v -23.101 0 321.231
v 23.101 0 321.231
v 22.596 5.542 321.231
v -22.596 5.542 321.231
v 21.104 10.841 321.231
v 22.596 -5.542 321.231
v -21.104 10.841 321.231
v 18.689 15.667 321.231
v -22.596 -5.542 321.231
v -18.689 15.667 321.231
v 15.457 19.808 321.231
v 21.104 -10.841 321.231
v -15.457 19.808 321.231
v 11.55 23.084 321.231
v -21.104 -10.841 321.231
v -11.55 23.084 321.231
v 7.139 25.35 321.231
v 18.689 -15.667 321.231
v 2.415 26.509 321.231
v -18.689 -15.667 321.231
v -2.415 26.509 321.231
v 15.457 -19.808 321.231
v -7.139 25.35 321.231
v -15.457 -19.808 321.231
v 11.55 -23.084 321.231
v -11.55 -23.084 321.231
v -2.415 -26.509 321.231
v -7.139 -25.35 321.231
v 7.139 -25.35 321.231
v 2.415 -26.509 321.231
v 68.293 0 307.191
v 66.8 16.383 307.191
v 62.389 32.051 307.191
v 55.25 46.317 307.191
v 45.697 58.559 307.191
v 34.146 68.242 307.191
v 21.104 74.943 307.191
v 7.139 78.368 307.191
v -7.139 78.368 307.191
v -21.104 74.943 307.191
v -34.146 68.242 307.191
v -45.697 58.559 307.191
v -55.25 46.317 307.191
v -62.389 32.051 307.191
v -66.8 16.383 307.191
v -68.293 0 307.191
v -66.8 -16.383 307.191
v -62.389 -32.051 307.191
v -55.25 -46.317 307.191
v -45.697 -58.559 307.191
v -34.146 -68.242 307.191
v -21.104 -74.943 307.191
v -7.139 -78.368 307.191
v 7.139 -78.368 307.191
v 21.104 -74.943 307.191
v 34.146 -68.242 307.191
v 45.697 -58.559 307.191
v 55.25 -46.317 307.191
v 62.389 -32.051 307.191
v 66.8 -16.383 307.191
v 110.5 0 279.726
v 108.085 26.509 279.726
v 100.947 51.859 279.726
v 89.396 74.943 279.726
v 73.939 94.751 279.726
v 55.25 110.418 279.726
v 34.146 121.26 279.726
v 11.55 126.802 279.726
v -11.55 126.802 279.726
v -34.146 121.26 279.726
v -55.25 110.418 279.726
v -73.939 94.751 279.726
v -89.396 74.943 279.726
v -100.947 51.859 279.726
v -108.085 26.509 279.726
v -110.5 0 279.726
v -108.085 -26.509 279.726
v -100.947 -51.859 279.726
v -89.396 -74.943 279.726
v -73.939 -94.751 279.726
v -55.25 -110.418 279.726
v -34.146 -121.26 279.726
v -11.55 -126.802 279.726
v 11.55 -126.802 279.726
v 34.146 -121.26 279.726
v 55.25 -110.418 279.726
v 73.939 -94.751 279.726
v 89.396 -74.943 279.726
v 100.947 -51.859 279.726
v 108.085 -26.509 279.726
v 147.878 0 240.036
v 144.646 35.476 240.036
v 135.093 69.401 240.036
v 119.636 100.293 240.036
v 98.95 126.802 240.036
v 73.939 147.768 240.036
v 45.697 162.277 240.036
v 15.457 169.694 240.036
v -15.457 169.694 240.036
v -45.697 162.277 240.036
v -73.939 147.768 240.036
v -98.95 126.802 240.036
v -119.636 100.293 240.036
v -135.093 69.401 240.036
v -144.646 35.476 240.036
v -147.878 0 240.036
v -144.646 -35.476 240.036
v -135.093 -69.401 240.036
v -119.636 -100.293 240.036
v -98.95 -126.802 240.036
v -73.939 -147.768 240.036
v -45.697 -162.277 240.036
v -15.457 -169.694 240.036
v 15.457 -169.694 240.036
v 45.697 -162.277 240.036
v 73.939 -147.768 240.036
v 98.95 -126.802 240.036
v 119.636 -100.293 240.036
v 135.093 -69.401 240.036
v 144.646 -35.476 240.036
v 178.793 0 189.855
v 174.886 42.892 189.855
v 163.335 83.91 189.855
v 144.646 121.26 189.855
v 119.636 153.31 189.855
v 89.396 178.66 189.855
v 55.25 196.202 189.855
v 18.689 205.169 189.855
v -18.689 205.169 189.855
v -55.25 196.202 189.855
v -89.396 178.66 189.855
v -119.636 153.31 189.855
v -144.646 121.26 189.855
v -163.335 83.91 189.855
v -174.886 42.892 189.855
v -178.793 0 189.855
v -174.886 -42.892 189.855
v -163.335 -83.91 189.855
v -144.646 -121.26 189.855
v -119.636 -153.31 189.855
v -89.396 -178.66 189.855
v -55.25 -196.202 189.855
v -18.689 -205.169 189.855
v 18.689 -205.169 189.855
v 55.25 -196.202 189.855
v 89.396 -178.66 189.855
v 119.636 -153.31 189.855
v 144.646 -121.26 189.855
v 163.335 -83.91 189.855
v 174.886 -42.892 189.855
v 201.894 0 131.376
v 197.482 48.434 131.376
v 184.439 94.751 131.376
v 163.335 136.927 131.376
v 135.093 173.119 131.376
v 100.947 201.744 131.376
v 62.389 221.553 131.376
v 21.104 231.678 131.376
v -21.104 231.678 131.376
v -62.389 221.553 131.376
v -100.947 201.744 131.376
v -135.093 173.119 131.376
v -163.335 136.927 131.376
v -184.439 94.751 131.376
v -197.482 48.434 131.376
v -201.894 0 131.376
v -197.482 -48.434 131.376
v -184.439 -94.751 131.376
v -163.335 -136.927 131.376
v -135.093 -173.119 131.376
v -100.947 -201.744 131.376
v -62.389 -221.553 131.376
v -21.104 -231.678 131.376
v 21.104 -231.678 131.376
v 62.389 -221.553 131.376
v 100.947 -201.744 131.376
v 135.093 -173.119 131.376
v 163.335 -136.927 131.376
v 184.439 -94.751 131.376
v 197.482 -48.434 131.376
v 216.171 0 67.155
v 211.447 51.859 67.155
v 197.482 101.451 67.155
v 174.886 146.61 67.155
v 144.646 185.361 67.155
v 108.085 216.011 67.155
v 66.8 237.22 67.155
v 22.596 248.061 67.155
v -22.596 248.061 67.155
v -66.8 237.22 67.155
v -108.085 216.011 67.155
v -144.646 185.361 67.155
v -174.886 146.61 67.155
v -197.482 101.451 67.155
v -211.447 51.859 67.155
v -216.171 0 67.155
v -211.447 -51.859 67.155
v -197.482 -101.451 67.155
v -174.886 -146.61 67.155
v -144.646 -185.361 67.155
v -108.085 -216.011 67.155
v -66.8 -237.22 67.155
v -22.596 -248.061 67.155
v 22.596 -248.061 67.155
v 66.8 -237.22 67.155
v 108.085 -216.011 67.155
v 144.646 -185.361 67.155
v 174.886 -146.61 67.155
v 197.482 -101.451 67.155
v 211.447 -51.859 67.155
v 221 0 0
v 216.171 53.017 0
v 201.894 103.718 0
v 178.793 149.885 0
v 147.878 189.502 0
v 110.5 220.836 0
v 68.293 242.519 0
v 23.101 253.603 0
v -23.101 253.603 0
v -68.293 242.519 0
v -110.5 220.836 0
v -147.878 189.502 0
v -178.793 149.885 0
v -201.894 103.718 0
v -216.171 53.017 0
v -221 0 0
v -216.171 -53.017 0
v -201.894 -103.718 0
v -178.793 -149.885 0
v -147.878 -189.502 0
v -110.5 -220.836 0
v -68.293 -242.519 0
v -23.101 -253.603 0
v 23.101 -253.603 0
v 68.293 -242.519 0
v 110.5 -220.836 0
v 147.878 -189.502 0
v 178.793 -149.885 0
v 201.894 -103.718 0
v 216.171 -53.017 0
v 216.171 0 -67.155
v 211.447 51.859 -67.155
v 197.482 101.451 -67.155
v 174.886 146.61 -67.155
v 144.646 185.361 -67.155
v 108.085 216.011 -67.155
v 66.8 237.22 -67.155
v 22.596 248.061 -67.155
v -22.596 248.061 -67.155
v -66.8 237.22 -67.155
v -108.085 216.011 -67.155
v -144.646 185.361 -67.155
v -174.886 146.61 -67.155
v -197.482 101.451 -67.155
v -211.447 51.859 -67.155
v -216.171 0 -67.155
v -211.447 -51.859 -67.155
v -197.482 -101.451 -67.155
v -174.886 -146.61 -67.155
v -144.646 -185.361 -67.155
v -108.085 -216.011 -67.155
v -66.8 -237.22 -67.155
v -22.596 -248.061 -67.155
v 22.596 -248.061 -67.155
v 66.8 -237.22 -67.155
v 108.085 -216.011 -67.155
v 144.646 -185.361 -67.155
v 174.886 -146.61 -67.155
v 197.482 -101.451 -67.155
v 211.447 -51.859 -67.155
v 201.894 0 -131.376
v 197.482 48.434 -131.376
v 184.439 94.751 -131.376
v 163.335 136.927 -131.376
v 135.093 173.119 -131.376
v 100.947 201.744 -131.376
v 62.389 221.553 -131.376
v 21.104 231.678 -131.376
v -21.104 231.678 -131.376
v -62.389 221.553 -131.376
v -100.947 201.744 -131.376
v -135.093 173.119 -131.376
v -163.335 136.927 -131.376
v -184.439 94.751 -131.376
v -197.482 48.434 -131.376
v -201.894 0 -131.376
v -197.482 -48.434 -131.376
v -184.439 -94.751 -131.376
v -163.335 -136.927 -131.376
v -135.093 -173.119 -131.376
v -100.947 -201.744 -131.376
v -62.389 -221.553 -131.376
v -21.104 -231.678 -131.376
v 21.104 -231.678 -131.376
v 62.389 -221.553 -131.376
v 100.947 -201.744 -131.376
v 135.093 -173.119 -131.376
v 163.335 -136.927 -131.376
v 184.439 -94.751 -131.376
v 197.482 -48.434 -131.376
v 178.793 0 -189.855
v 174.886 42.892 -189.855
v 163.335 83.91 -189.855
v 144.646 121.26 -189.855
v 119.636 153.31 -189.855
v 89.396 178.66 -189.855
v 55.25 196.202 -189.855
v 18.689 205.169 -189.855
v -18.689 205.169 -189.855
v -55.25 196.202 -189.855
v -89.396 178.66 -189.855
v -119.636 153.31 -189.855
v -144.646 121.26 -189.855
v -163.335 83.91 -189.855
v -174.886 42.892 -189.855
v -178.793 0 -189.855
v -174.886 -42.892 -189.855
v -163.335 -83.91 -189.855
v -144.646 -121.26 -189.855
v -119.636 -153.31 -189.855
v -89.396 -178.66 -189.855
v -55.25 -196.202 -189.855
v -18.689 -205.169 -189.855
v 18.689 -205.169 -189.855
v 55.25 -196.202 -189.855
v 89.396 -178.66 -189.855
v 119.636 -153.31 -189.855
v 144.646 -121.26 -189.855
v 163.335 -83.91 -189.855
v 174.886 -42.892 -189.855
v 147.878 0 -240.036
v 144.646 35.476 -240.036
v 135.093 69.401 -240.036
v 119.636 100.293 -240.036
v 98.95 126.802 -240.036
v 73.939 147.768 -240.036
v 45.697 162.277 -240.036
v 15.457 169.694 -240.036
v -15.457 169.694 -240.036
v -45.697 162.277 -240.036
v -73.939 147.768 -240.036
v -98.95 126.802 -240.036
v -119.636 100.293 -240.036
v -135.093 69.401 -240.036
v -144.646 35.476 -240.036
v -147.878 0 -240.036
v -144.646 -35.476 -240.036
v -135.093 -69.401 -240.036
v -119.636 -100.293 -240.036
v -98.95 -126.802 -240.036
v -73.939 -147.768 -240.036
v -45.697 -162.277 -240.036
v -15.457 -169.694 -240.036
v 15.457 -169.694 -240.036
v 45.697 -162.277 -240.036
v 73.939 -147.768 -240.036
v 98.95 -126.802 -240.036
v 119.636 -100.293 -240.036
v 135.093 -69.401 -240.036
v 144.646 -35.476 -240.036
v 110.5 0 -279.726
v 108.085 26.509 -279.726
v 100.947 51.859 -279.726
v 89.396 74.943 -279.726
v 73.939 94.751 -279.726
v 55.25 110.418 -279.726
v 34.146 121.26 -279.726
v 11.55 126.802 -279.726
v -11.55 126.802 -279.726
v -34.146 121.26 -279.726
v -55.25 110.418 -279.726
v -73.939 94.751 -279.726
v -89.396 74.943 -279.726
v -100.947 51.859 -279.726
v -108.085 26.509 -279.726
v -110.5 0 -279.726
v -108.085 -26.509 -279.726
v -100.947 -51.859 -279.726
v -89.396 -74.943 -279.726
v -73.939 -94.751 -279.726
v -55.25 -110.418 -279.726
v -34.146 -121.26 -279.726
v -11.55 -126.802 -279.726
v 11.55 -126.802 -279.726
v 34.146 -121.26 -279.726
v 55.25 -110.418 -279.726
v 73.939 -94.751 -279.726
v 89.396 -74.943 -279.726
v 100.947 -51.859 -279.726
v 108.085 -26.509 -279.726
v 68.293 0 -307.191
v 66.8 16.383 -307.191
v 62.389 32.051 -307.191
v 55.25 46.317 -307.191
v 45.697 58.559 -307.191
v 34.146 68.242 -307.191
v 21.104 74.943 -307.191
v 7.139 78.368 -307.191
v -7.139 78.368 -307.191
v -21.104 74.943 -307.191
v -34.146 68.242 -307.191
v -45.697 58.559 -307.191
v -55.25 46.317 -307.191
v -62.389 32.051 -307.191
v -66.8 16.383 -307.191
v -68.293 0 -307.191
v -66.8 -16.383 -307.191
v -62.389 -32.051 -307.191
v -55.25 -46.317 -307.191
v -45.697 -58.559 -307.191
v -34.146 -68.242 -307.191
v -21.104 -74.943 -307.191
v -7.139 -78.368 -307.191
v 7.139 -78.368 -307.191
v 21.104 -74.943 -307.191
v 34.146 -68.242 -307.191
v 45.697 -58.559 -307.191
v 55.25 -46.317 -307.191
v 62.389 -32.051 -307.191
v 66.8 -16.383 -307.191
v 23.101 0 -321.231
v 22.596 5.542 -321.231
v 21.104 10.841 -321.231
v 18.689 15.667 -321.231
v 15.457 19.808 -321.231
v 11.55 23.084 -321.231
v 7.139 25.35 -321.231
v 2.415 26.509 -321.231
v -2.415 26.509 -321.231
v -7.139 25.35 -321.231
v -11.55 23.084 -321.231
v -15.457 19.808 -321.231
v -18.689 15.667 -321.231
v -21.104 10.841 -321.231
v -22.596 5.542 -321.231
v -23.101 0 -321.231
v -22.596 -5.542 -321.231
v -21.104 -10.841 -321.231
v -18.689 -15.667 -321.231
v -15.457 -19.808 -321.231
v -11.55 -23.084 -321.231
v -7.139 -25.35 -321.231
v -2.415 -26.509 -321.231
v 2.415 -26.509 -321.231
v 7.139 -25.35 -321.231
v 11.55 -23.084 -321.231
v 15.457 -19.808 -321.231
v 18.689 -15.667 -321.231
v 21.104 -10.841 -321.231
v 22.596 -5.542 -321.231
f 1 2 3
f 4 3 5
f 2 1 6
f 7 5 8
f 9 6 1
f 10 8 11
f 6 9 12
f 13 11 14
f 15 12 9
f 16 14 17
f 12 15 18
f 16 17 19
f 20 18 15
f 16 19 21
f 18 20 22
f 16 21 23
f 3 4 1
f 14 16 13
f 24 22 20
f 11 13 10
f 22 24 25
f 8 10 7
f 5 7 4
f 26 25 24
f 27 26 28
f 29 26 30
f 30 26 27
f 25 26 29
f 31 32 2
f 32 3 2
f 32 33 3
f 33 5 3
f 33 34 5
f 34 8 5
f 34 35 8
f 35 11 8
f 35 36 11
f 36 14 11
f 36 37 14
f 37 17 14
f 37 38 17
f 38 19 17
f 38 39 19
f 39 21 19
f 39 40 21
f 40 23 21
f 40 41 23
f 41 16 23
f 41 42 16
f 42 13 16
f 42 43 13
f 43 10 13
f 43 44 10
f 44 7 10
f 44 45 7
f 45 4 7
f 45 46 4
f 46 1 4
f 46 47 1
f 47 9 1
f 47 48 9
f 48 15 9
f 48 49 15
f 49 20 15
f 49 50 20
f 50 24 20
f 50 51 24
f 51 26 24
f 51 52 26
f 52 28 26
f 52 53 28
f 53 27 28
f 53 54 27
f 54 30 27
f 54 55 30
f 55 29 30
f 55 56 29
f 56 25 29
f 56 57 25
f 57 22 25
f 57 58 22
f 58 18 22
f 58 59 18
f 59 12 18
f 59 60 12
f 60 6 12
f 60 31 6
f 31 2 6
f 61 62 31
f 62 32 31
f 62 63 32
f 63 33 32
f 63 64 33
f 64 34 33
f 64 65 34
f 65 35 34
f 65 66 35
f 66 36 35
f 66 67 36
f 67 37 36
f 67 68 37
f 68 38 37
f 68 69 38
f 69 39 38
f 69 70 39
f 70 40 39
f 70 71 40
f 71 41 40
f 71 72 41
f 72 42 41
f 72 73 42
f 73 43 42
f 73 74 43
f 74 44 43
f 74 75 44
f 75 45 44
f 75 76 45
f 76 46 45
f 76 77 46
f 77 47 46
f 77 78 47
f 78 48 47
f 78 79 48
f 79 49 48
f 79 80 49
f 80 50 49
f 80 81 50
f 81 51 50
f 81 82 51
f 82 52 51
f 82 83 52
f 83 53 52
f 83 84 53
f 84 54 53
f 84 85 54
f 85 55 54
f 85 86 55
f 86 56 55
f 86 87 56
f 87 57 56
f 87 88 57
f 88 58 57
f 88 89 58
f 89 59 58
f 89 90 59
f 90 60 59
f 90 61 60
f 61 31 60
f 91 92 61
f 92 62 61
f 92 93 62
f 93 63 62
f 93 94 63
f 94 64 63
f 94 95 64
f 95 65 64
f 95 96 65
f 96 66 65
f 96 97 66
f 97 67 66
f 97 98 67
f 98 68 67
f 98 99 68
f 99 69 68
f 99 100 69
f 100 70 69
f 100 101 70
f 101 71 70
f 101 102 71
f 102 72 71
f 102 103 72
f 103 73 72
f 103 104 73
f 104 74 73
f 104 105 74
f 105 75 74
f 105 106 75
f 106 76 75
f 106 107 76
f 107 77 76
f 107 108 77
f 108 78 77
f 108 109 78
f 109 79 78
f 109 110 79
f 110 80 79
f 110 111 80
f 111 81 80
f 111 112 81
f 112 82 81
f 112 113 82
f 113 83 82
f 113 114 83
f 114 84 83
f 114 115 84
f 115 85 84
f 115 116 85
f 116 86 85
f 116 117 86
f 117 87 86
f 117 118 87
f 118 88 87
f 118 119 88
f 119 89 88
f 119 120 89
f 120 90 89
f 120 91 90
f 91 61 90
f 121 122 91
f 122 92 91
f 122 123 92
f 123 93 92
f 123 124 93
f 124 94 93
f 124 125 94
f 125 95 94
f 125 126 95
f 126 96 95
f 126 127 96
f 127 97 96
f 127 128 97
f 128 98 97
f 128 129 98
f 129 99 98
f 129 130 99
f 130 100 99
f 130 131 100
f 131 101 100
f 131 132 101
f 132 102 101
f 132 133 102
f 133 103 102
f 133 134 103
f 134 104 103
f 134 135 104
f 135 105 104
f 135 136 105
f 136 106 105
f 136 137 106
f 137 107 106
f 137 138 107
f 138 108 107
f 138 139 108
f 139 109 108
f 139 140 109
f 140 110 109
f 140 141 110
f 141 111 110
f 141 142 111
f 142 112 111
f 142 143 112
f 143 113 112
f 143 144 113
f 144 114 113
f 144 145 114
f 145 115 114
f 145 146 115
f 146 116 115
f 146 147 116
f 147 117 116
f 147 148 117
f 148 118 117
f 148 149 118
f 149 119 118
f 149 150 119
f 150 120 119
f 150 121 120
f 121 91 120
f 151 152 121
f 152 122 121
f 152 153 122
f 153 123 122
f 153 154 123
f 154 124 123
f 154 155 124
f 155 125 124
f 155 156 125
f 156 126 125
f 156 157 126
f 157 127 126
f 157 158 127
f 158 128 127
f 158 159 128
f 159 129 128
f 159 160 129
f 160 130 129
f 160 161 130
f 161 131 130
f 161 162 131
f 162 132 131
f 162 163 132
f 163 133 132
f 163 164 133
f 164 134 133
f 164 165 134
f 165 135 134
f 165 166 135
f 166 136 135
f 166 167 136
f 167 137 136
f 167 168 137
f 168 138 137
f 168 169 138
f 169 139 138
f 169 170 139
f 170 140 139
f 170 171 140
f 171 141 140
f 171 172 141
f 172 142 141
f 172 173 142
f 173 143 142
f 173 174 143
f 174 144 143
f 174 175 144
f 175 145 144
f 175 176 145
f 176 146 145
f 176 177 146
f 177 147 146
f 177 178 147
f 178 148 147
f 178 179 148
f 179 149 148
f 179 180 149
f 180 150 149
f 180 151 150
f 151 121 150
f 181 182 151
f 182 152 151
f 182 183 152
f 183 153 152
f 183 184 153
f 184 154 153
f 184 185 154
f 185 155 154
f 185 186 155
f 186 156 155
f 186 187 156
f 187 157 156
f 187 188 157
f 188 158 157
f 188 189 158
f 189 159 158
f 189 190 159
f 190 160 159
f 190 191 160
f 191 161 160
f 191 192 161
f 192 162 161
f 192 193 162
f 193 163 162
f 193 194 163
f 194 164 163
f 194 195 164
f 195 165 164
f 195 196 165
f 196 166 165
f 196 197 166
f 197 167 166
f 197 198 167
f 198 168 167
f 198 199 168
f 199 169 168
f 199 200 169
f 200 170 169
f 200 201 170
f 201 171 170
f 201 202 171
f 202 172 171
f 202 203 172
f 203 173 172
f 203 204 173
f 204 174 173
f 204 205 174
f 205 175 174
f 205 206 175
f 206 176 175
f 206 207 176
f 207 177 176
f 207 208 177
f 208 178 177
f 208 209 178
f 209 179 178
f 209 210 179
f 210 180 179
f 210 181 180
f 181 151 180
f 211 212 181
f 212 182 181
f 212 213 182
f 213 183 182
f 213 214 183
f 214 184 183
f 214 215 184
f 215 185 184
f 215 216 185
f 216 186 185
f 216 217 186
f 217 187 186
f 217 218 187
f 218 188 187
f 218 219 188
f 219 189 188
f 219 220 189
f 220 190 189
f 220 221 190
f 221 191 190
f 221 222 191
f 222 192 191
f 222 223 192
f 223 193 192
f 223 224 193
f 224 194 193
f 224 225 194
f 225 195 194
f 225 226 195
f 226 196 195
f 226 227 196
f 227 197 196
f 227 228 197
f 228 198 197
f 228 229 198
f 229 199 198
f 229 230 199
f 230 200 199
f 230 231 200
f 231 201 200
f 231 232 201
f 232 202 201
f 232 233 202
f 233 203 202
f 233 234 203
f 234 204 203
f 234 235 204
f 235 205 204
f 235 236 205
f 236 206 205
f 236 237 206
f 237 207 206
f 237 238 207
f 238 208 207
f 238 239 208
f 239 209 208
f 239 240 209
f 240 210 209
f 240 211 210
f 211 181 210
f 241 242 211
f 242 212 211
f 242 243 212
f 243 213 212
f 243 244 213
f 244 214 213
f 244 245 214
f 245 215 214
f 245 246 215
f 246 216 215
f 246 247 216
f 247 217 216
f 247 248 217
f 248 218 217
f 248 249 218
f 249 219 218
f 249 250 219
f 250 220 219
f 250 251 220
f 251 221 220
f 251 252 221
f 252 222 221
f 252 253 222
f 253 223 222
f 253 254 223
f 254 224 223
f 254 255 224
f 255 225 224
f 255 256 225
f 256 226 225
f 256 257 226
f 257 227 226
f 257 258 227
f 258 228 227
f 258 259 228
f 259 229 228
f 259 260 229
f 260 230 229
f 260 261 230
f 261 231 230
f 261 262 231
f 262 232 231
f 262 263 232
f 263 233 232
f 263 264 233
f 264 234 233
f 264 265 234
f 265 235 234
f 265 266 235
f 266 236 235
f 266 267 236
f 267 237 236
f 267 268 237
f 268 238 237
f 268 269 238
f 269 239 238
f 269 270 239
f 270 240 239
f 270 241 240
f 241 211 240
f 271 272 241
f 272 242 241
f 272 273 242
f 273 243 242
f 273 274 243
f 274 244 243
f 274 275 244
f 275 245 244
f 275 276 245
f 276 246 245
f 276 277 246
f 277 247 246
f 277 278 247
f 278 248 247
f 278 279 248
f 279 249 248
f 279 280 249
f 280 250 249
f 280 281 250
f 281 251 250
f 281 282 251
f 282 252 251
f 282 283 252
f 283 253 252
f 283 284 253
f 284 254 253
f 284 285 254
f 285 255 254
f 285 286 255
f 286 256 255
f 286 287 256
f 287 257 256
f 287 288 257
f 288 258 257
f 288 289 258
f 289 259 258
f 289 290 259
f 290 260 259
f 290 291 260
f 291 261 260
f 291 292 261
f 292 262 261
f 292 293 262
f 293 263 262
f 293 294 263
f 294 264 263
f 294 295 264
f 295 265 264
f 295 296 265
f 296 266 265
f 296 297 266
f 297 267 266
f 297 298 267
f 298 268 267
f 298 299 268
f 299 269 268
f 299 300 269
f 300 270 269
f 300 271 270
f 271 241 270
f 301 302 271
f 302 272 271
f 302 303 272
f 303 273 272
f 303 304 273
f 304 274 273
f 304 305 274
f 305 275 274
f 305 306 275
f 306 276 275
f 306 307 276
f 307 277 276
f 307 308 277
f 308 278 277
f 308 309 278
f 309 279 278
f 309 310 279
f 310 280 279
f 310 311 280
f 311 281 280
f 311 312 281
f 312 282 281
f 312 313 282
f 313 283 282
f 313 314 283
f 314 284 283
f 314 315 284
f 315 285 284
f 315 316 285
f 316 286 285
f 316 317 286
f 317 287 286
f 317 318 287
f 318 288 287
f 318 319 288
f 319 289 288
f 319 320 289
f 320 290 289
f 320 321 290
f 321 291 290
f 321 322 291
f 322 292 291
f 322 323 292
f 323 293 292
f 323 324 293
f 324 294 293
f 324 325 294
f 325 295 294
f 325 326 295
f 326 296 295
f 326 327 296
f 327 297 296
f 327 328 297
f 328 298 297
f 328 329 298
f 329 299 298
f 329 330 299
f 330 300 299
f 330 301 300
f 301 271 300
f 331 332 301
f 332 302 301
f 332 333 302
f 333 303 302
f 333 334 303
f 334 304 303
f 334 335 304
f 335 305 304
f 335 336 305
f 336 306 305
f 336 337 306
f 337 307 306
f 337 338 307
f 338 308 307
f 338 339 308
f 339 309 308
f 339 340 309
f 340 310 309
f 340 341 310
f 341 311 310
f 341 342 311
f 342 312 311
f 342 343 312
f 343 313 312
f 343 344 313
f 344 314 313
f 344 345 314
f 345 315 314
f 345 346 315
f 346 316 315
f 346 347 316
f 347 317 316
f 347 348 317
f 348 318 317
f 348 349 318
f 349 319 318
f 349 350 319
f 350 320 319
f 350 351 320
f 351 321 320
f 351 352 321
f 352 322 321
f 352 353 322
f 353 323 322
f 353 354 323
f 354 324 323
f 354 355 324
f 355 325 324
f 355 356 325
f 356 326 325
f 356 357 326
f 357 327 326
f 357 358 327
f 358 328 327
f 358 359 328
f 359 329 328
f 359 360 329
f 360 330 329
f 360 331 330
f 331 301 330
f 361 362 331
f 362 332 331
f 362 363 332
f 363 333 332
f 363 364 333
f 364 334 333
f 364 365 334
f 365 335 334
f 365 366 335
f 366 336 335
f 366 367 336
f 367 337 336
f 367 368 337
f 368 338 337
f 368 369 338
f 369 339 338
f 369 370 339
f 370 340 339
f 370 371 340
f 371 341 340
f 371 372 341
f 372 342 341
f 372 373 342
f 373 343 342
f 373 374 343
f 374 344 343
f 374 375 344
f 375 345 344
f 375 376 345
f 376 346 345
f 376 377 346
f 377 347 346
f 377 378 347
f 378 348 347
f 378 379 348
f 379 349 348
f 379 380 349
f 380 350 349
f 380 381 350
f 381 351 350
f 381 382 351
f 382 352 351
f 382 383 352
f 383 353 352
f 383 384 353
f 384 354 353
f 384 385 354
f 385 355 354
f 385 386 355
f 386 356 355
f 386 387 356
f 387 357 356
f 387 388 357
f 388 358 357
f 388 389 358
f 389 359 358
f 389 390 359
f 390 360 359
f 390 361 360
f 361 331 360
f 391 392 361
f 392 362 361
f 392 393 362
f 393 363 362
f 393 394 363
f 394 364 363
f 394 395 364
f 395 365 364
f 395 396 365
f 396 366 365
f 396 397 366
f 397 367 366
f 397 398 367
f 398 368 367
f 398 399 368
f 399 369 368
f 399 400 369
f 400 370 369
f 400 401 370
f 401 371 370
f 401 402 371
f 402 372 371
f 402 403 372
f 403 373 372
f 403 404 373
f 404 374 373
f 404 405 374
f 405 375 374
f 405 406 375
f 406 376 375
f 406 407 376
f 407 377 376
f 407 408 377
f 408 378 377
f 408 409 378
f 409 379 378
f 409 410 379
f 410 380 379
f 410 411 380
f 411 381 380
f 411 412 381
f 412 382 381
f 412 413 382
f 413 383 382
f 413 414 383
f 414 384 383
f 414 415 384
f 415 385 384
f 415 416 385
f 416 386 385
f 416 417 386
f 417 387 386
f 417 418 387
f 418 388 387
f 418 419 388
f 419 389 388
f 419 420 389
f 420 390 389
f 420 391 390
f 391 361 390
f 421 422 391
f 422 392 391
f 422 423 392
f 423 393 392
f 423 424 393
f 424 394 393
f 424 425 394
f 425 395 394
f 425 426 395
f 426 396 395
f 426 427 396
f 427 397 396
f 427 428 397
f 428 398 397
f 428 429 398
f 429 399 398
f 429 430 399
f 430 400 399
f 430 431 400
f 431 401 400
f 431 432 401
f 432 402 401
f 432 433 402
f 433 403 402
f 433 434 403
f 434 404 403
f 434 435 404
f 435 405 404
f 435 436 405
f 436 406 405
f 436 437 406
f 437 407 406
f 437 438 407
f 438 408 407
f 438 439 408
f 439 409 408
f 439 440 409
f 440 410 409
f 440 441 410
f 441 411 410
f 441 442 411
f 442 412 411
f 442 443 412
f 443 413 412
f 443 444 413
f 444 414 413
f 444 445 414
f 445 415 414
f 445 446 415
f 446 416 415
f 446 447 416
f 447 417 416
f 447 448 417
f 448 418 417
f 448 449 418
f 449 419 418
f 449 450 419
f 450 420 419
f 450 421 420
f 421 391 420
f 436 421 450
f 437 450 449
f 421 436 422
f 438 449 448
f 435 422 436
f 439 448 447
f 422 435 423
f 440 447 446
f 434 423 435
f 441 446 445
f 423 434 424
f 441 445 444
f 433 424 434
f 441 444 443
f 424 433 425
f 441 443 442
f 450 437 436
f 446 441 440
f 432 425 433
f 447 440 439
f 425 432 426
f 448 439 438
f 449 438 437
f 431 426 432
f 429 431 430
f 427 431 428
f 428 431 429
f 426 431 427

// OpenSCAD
// Generated by SolidPython 1.0.1 on 2020-07-29 00:46:51


scale(v = [13, 15, 19]) {
	sphere(r = 17);
}
/***********************************************
*********      SolidPython code:      **********
************************************************
 
# import packages: SolidPython
from solid import *
from solid.utils import *
from itertools import chain, combinations, permutations


class Resize:

    def __init__(self, scad_file):
        self.scad_file = scad_file
        #self.scad_file = import_scad(scad_file)
        # cone/cylinder param:
        self.r1 = 0
        self.r2 = 0
        self.h = 0
        # rectangular prism param:
        self.w = 0
        self.l = 0
        # ellipse param:
        self.r = 0

    # import OpenScad code (file name corresponds to shape)


    # classify shape + parameters
    def assign(self, param1, param2, param3):
        if self.scad_file == 'cone.scad':
            self.r1 = param1
            self.r2 = param2
            self.h = param3
        elif self.scad_file == 'cylinder.scad':
            self.r1 = param1
            self.r2 = param2
            self.h = param3
        elif self.scad_file == 'rectangularPrism.scad':
            self.h = param1
            self.l = param2
            self.w = param3
        else:
            self.r = param1
            self.h = param2

    # resize parameters
    def iterate(self):
        x = range(3, 20, 2)
        i = 1
        if self.scad_file == 'cone.scad':
            tempList = list(permutations(x, 2))
            for temp in tempList:
                param1 = temp[0]
                param2 = temp[1]
                filepath = 'produced_scad_files/' + 'cone' + str(param1) + '_' + str(param2) + '_' + '.scad'
                scad_render_to_file(cylinder(h=param1, r1=param2, r2=0), filepath)

        elif self.scad_file == 'cylinder.scad':
            tempList = list(permutations(x, 3))
            for temp in tempList:
                param1 = temp[0]
                param2 = temp[1]
                filepath = 'produced_scad_files/' + 'cylinder' + str(param1) + '_' + str(param2) + '_' + '.scad'
                scad_render_to_file(cylinder(h=param1, r1=param2, r2=param2), filepath)

        elif self.scad_file == 'rectangularPrism.scad':
            tempList = list(permutations(x, 3))
            for temp in tempList:
                param1 = temp[0]
                param2 = temp[1]
                param3 = temp[2]
                filepath = 'produced_scad_files/' + 'rectangularPrism' + str(param1) + '_' + str(param2) + '_' + str(
                    param3) + '.scad'
                scad_render_to_file(cube(size=(param1, param2, param3)), filepath)

        elif self.scad_file == 'ellipse.scad':
            tempList = list(permutations(x, 4))
            for temp in tempList:
                param1 = temp[0]
                param2 = temp[1]
                param3 = temp[2]
                param4 = temp[3]
                filepath = 'produced_scad_files/' + 'ellipse' + str(param1) + '_' + str(param2) + '_' + str(param3) + '_' + str(param4) + '.scad'
                scad_render_to_file(scale([param1, param2, param3])(sphere(r=param4)), filepath)

    def render_to_scadfile(self):
        scad_render_to_file(scad, 'example.scad') 
 
************************************************/
